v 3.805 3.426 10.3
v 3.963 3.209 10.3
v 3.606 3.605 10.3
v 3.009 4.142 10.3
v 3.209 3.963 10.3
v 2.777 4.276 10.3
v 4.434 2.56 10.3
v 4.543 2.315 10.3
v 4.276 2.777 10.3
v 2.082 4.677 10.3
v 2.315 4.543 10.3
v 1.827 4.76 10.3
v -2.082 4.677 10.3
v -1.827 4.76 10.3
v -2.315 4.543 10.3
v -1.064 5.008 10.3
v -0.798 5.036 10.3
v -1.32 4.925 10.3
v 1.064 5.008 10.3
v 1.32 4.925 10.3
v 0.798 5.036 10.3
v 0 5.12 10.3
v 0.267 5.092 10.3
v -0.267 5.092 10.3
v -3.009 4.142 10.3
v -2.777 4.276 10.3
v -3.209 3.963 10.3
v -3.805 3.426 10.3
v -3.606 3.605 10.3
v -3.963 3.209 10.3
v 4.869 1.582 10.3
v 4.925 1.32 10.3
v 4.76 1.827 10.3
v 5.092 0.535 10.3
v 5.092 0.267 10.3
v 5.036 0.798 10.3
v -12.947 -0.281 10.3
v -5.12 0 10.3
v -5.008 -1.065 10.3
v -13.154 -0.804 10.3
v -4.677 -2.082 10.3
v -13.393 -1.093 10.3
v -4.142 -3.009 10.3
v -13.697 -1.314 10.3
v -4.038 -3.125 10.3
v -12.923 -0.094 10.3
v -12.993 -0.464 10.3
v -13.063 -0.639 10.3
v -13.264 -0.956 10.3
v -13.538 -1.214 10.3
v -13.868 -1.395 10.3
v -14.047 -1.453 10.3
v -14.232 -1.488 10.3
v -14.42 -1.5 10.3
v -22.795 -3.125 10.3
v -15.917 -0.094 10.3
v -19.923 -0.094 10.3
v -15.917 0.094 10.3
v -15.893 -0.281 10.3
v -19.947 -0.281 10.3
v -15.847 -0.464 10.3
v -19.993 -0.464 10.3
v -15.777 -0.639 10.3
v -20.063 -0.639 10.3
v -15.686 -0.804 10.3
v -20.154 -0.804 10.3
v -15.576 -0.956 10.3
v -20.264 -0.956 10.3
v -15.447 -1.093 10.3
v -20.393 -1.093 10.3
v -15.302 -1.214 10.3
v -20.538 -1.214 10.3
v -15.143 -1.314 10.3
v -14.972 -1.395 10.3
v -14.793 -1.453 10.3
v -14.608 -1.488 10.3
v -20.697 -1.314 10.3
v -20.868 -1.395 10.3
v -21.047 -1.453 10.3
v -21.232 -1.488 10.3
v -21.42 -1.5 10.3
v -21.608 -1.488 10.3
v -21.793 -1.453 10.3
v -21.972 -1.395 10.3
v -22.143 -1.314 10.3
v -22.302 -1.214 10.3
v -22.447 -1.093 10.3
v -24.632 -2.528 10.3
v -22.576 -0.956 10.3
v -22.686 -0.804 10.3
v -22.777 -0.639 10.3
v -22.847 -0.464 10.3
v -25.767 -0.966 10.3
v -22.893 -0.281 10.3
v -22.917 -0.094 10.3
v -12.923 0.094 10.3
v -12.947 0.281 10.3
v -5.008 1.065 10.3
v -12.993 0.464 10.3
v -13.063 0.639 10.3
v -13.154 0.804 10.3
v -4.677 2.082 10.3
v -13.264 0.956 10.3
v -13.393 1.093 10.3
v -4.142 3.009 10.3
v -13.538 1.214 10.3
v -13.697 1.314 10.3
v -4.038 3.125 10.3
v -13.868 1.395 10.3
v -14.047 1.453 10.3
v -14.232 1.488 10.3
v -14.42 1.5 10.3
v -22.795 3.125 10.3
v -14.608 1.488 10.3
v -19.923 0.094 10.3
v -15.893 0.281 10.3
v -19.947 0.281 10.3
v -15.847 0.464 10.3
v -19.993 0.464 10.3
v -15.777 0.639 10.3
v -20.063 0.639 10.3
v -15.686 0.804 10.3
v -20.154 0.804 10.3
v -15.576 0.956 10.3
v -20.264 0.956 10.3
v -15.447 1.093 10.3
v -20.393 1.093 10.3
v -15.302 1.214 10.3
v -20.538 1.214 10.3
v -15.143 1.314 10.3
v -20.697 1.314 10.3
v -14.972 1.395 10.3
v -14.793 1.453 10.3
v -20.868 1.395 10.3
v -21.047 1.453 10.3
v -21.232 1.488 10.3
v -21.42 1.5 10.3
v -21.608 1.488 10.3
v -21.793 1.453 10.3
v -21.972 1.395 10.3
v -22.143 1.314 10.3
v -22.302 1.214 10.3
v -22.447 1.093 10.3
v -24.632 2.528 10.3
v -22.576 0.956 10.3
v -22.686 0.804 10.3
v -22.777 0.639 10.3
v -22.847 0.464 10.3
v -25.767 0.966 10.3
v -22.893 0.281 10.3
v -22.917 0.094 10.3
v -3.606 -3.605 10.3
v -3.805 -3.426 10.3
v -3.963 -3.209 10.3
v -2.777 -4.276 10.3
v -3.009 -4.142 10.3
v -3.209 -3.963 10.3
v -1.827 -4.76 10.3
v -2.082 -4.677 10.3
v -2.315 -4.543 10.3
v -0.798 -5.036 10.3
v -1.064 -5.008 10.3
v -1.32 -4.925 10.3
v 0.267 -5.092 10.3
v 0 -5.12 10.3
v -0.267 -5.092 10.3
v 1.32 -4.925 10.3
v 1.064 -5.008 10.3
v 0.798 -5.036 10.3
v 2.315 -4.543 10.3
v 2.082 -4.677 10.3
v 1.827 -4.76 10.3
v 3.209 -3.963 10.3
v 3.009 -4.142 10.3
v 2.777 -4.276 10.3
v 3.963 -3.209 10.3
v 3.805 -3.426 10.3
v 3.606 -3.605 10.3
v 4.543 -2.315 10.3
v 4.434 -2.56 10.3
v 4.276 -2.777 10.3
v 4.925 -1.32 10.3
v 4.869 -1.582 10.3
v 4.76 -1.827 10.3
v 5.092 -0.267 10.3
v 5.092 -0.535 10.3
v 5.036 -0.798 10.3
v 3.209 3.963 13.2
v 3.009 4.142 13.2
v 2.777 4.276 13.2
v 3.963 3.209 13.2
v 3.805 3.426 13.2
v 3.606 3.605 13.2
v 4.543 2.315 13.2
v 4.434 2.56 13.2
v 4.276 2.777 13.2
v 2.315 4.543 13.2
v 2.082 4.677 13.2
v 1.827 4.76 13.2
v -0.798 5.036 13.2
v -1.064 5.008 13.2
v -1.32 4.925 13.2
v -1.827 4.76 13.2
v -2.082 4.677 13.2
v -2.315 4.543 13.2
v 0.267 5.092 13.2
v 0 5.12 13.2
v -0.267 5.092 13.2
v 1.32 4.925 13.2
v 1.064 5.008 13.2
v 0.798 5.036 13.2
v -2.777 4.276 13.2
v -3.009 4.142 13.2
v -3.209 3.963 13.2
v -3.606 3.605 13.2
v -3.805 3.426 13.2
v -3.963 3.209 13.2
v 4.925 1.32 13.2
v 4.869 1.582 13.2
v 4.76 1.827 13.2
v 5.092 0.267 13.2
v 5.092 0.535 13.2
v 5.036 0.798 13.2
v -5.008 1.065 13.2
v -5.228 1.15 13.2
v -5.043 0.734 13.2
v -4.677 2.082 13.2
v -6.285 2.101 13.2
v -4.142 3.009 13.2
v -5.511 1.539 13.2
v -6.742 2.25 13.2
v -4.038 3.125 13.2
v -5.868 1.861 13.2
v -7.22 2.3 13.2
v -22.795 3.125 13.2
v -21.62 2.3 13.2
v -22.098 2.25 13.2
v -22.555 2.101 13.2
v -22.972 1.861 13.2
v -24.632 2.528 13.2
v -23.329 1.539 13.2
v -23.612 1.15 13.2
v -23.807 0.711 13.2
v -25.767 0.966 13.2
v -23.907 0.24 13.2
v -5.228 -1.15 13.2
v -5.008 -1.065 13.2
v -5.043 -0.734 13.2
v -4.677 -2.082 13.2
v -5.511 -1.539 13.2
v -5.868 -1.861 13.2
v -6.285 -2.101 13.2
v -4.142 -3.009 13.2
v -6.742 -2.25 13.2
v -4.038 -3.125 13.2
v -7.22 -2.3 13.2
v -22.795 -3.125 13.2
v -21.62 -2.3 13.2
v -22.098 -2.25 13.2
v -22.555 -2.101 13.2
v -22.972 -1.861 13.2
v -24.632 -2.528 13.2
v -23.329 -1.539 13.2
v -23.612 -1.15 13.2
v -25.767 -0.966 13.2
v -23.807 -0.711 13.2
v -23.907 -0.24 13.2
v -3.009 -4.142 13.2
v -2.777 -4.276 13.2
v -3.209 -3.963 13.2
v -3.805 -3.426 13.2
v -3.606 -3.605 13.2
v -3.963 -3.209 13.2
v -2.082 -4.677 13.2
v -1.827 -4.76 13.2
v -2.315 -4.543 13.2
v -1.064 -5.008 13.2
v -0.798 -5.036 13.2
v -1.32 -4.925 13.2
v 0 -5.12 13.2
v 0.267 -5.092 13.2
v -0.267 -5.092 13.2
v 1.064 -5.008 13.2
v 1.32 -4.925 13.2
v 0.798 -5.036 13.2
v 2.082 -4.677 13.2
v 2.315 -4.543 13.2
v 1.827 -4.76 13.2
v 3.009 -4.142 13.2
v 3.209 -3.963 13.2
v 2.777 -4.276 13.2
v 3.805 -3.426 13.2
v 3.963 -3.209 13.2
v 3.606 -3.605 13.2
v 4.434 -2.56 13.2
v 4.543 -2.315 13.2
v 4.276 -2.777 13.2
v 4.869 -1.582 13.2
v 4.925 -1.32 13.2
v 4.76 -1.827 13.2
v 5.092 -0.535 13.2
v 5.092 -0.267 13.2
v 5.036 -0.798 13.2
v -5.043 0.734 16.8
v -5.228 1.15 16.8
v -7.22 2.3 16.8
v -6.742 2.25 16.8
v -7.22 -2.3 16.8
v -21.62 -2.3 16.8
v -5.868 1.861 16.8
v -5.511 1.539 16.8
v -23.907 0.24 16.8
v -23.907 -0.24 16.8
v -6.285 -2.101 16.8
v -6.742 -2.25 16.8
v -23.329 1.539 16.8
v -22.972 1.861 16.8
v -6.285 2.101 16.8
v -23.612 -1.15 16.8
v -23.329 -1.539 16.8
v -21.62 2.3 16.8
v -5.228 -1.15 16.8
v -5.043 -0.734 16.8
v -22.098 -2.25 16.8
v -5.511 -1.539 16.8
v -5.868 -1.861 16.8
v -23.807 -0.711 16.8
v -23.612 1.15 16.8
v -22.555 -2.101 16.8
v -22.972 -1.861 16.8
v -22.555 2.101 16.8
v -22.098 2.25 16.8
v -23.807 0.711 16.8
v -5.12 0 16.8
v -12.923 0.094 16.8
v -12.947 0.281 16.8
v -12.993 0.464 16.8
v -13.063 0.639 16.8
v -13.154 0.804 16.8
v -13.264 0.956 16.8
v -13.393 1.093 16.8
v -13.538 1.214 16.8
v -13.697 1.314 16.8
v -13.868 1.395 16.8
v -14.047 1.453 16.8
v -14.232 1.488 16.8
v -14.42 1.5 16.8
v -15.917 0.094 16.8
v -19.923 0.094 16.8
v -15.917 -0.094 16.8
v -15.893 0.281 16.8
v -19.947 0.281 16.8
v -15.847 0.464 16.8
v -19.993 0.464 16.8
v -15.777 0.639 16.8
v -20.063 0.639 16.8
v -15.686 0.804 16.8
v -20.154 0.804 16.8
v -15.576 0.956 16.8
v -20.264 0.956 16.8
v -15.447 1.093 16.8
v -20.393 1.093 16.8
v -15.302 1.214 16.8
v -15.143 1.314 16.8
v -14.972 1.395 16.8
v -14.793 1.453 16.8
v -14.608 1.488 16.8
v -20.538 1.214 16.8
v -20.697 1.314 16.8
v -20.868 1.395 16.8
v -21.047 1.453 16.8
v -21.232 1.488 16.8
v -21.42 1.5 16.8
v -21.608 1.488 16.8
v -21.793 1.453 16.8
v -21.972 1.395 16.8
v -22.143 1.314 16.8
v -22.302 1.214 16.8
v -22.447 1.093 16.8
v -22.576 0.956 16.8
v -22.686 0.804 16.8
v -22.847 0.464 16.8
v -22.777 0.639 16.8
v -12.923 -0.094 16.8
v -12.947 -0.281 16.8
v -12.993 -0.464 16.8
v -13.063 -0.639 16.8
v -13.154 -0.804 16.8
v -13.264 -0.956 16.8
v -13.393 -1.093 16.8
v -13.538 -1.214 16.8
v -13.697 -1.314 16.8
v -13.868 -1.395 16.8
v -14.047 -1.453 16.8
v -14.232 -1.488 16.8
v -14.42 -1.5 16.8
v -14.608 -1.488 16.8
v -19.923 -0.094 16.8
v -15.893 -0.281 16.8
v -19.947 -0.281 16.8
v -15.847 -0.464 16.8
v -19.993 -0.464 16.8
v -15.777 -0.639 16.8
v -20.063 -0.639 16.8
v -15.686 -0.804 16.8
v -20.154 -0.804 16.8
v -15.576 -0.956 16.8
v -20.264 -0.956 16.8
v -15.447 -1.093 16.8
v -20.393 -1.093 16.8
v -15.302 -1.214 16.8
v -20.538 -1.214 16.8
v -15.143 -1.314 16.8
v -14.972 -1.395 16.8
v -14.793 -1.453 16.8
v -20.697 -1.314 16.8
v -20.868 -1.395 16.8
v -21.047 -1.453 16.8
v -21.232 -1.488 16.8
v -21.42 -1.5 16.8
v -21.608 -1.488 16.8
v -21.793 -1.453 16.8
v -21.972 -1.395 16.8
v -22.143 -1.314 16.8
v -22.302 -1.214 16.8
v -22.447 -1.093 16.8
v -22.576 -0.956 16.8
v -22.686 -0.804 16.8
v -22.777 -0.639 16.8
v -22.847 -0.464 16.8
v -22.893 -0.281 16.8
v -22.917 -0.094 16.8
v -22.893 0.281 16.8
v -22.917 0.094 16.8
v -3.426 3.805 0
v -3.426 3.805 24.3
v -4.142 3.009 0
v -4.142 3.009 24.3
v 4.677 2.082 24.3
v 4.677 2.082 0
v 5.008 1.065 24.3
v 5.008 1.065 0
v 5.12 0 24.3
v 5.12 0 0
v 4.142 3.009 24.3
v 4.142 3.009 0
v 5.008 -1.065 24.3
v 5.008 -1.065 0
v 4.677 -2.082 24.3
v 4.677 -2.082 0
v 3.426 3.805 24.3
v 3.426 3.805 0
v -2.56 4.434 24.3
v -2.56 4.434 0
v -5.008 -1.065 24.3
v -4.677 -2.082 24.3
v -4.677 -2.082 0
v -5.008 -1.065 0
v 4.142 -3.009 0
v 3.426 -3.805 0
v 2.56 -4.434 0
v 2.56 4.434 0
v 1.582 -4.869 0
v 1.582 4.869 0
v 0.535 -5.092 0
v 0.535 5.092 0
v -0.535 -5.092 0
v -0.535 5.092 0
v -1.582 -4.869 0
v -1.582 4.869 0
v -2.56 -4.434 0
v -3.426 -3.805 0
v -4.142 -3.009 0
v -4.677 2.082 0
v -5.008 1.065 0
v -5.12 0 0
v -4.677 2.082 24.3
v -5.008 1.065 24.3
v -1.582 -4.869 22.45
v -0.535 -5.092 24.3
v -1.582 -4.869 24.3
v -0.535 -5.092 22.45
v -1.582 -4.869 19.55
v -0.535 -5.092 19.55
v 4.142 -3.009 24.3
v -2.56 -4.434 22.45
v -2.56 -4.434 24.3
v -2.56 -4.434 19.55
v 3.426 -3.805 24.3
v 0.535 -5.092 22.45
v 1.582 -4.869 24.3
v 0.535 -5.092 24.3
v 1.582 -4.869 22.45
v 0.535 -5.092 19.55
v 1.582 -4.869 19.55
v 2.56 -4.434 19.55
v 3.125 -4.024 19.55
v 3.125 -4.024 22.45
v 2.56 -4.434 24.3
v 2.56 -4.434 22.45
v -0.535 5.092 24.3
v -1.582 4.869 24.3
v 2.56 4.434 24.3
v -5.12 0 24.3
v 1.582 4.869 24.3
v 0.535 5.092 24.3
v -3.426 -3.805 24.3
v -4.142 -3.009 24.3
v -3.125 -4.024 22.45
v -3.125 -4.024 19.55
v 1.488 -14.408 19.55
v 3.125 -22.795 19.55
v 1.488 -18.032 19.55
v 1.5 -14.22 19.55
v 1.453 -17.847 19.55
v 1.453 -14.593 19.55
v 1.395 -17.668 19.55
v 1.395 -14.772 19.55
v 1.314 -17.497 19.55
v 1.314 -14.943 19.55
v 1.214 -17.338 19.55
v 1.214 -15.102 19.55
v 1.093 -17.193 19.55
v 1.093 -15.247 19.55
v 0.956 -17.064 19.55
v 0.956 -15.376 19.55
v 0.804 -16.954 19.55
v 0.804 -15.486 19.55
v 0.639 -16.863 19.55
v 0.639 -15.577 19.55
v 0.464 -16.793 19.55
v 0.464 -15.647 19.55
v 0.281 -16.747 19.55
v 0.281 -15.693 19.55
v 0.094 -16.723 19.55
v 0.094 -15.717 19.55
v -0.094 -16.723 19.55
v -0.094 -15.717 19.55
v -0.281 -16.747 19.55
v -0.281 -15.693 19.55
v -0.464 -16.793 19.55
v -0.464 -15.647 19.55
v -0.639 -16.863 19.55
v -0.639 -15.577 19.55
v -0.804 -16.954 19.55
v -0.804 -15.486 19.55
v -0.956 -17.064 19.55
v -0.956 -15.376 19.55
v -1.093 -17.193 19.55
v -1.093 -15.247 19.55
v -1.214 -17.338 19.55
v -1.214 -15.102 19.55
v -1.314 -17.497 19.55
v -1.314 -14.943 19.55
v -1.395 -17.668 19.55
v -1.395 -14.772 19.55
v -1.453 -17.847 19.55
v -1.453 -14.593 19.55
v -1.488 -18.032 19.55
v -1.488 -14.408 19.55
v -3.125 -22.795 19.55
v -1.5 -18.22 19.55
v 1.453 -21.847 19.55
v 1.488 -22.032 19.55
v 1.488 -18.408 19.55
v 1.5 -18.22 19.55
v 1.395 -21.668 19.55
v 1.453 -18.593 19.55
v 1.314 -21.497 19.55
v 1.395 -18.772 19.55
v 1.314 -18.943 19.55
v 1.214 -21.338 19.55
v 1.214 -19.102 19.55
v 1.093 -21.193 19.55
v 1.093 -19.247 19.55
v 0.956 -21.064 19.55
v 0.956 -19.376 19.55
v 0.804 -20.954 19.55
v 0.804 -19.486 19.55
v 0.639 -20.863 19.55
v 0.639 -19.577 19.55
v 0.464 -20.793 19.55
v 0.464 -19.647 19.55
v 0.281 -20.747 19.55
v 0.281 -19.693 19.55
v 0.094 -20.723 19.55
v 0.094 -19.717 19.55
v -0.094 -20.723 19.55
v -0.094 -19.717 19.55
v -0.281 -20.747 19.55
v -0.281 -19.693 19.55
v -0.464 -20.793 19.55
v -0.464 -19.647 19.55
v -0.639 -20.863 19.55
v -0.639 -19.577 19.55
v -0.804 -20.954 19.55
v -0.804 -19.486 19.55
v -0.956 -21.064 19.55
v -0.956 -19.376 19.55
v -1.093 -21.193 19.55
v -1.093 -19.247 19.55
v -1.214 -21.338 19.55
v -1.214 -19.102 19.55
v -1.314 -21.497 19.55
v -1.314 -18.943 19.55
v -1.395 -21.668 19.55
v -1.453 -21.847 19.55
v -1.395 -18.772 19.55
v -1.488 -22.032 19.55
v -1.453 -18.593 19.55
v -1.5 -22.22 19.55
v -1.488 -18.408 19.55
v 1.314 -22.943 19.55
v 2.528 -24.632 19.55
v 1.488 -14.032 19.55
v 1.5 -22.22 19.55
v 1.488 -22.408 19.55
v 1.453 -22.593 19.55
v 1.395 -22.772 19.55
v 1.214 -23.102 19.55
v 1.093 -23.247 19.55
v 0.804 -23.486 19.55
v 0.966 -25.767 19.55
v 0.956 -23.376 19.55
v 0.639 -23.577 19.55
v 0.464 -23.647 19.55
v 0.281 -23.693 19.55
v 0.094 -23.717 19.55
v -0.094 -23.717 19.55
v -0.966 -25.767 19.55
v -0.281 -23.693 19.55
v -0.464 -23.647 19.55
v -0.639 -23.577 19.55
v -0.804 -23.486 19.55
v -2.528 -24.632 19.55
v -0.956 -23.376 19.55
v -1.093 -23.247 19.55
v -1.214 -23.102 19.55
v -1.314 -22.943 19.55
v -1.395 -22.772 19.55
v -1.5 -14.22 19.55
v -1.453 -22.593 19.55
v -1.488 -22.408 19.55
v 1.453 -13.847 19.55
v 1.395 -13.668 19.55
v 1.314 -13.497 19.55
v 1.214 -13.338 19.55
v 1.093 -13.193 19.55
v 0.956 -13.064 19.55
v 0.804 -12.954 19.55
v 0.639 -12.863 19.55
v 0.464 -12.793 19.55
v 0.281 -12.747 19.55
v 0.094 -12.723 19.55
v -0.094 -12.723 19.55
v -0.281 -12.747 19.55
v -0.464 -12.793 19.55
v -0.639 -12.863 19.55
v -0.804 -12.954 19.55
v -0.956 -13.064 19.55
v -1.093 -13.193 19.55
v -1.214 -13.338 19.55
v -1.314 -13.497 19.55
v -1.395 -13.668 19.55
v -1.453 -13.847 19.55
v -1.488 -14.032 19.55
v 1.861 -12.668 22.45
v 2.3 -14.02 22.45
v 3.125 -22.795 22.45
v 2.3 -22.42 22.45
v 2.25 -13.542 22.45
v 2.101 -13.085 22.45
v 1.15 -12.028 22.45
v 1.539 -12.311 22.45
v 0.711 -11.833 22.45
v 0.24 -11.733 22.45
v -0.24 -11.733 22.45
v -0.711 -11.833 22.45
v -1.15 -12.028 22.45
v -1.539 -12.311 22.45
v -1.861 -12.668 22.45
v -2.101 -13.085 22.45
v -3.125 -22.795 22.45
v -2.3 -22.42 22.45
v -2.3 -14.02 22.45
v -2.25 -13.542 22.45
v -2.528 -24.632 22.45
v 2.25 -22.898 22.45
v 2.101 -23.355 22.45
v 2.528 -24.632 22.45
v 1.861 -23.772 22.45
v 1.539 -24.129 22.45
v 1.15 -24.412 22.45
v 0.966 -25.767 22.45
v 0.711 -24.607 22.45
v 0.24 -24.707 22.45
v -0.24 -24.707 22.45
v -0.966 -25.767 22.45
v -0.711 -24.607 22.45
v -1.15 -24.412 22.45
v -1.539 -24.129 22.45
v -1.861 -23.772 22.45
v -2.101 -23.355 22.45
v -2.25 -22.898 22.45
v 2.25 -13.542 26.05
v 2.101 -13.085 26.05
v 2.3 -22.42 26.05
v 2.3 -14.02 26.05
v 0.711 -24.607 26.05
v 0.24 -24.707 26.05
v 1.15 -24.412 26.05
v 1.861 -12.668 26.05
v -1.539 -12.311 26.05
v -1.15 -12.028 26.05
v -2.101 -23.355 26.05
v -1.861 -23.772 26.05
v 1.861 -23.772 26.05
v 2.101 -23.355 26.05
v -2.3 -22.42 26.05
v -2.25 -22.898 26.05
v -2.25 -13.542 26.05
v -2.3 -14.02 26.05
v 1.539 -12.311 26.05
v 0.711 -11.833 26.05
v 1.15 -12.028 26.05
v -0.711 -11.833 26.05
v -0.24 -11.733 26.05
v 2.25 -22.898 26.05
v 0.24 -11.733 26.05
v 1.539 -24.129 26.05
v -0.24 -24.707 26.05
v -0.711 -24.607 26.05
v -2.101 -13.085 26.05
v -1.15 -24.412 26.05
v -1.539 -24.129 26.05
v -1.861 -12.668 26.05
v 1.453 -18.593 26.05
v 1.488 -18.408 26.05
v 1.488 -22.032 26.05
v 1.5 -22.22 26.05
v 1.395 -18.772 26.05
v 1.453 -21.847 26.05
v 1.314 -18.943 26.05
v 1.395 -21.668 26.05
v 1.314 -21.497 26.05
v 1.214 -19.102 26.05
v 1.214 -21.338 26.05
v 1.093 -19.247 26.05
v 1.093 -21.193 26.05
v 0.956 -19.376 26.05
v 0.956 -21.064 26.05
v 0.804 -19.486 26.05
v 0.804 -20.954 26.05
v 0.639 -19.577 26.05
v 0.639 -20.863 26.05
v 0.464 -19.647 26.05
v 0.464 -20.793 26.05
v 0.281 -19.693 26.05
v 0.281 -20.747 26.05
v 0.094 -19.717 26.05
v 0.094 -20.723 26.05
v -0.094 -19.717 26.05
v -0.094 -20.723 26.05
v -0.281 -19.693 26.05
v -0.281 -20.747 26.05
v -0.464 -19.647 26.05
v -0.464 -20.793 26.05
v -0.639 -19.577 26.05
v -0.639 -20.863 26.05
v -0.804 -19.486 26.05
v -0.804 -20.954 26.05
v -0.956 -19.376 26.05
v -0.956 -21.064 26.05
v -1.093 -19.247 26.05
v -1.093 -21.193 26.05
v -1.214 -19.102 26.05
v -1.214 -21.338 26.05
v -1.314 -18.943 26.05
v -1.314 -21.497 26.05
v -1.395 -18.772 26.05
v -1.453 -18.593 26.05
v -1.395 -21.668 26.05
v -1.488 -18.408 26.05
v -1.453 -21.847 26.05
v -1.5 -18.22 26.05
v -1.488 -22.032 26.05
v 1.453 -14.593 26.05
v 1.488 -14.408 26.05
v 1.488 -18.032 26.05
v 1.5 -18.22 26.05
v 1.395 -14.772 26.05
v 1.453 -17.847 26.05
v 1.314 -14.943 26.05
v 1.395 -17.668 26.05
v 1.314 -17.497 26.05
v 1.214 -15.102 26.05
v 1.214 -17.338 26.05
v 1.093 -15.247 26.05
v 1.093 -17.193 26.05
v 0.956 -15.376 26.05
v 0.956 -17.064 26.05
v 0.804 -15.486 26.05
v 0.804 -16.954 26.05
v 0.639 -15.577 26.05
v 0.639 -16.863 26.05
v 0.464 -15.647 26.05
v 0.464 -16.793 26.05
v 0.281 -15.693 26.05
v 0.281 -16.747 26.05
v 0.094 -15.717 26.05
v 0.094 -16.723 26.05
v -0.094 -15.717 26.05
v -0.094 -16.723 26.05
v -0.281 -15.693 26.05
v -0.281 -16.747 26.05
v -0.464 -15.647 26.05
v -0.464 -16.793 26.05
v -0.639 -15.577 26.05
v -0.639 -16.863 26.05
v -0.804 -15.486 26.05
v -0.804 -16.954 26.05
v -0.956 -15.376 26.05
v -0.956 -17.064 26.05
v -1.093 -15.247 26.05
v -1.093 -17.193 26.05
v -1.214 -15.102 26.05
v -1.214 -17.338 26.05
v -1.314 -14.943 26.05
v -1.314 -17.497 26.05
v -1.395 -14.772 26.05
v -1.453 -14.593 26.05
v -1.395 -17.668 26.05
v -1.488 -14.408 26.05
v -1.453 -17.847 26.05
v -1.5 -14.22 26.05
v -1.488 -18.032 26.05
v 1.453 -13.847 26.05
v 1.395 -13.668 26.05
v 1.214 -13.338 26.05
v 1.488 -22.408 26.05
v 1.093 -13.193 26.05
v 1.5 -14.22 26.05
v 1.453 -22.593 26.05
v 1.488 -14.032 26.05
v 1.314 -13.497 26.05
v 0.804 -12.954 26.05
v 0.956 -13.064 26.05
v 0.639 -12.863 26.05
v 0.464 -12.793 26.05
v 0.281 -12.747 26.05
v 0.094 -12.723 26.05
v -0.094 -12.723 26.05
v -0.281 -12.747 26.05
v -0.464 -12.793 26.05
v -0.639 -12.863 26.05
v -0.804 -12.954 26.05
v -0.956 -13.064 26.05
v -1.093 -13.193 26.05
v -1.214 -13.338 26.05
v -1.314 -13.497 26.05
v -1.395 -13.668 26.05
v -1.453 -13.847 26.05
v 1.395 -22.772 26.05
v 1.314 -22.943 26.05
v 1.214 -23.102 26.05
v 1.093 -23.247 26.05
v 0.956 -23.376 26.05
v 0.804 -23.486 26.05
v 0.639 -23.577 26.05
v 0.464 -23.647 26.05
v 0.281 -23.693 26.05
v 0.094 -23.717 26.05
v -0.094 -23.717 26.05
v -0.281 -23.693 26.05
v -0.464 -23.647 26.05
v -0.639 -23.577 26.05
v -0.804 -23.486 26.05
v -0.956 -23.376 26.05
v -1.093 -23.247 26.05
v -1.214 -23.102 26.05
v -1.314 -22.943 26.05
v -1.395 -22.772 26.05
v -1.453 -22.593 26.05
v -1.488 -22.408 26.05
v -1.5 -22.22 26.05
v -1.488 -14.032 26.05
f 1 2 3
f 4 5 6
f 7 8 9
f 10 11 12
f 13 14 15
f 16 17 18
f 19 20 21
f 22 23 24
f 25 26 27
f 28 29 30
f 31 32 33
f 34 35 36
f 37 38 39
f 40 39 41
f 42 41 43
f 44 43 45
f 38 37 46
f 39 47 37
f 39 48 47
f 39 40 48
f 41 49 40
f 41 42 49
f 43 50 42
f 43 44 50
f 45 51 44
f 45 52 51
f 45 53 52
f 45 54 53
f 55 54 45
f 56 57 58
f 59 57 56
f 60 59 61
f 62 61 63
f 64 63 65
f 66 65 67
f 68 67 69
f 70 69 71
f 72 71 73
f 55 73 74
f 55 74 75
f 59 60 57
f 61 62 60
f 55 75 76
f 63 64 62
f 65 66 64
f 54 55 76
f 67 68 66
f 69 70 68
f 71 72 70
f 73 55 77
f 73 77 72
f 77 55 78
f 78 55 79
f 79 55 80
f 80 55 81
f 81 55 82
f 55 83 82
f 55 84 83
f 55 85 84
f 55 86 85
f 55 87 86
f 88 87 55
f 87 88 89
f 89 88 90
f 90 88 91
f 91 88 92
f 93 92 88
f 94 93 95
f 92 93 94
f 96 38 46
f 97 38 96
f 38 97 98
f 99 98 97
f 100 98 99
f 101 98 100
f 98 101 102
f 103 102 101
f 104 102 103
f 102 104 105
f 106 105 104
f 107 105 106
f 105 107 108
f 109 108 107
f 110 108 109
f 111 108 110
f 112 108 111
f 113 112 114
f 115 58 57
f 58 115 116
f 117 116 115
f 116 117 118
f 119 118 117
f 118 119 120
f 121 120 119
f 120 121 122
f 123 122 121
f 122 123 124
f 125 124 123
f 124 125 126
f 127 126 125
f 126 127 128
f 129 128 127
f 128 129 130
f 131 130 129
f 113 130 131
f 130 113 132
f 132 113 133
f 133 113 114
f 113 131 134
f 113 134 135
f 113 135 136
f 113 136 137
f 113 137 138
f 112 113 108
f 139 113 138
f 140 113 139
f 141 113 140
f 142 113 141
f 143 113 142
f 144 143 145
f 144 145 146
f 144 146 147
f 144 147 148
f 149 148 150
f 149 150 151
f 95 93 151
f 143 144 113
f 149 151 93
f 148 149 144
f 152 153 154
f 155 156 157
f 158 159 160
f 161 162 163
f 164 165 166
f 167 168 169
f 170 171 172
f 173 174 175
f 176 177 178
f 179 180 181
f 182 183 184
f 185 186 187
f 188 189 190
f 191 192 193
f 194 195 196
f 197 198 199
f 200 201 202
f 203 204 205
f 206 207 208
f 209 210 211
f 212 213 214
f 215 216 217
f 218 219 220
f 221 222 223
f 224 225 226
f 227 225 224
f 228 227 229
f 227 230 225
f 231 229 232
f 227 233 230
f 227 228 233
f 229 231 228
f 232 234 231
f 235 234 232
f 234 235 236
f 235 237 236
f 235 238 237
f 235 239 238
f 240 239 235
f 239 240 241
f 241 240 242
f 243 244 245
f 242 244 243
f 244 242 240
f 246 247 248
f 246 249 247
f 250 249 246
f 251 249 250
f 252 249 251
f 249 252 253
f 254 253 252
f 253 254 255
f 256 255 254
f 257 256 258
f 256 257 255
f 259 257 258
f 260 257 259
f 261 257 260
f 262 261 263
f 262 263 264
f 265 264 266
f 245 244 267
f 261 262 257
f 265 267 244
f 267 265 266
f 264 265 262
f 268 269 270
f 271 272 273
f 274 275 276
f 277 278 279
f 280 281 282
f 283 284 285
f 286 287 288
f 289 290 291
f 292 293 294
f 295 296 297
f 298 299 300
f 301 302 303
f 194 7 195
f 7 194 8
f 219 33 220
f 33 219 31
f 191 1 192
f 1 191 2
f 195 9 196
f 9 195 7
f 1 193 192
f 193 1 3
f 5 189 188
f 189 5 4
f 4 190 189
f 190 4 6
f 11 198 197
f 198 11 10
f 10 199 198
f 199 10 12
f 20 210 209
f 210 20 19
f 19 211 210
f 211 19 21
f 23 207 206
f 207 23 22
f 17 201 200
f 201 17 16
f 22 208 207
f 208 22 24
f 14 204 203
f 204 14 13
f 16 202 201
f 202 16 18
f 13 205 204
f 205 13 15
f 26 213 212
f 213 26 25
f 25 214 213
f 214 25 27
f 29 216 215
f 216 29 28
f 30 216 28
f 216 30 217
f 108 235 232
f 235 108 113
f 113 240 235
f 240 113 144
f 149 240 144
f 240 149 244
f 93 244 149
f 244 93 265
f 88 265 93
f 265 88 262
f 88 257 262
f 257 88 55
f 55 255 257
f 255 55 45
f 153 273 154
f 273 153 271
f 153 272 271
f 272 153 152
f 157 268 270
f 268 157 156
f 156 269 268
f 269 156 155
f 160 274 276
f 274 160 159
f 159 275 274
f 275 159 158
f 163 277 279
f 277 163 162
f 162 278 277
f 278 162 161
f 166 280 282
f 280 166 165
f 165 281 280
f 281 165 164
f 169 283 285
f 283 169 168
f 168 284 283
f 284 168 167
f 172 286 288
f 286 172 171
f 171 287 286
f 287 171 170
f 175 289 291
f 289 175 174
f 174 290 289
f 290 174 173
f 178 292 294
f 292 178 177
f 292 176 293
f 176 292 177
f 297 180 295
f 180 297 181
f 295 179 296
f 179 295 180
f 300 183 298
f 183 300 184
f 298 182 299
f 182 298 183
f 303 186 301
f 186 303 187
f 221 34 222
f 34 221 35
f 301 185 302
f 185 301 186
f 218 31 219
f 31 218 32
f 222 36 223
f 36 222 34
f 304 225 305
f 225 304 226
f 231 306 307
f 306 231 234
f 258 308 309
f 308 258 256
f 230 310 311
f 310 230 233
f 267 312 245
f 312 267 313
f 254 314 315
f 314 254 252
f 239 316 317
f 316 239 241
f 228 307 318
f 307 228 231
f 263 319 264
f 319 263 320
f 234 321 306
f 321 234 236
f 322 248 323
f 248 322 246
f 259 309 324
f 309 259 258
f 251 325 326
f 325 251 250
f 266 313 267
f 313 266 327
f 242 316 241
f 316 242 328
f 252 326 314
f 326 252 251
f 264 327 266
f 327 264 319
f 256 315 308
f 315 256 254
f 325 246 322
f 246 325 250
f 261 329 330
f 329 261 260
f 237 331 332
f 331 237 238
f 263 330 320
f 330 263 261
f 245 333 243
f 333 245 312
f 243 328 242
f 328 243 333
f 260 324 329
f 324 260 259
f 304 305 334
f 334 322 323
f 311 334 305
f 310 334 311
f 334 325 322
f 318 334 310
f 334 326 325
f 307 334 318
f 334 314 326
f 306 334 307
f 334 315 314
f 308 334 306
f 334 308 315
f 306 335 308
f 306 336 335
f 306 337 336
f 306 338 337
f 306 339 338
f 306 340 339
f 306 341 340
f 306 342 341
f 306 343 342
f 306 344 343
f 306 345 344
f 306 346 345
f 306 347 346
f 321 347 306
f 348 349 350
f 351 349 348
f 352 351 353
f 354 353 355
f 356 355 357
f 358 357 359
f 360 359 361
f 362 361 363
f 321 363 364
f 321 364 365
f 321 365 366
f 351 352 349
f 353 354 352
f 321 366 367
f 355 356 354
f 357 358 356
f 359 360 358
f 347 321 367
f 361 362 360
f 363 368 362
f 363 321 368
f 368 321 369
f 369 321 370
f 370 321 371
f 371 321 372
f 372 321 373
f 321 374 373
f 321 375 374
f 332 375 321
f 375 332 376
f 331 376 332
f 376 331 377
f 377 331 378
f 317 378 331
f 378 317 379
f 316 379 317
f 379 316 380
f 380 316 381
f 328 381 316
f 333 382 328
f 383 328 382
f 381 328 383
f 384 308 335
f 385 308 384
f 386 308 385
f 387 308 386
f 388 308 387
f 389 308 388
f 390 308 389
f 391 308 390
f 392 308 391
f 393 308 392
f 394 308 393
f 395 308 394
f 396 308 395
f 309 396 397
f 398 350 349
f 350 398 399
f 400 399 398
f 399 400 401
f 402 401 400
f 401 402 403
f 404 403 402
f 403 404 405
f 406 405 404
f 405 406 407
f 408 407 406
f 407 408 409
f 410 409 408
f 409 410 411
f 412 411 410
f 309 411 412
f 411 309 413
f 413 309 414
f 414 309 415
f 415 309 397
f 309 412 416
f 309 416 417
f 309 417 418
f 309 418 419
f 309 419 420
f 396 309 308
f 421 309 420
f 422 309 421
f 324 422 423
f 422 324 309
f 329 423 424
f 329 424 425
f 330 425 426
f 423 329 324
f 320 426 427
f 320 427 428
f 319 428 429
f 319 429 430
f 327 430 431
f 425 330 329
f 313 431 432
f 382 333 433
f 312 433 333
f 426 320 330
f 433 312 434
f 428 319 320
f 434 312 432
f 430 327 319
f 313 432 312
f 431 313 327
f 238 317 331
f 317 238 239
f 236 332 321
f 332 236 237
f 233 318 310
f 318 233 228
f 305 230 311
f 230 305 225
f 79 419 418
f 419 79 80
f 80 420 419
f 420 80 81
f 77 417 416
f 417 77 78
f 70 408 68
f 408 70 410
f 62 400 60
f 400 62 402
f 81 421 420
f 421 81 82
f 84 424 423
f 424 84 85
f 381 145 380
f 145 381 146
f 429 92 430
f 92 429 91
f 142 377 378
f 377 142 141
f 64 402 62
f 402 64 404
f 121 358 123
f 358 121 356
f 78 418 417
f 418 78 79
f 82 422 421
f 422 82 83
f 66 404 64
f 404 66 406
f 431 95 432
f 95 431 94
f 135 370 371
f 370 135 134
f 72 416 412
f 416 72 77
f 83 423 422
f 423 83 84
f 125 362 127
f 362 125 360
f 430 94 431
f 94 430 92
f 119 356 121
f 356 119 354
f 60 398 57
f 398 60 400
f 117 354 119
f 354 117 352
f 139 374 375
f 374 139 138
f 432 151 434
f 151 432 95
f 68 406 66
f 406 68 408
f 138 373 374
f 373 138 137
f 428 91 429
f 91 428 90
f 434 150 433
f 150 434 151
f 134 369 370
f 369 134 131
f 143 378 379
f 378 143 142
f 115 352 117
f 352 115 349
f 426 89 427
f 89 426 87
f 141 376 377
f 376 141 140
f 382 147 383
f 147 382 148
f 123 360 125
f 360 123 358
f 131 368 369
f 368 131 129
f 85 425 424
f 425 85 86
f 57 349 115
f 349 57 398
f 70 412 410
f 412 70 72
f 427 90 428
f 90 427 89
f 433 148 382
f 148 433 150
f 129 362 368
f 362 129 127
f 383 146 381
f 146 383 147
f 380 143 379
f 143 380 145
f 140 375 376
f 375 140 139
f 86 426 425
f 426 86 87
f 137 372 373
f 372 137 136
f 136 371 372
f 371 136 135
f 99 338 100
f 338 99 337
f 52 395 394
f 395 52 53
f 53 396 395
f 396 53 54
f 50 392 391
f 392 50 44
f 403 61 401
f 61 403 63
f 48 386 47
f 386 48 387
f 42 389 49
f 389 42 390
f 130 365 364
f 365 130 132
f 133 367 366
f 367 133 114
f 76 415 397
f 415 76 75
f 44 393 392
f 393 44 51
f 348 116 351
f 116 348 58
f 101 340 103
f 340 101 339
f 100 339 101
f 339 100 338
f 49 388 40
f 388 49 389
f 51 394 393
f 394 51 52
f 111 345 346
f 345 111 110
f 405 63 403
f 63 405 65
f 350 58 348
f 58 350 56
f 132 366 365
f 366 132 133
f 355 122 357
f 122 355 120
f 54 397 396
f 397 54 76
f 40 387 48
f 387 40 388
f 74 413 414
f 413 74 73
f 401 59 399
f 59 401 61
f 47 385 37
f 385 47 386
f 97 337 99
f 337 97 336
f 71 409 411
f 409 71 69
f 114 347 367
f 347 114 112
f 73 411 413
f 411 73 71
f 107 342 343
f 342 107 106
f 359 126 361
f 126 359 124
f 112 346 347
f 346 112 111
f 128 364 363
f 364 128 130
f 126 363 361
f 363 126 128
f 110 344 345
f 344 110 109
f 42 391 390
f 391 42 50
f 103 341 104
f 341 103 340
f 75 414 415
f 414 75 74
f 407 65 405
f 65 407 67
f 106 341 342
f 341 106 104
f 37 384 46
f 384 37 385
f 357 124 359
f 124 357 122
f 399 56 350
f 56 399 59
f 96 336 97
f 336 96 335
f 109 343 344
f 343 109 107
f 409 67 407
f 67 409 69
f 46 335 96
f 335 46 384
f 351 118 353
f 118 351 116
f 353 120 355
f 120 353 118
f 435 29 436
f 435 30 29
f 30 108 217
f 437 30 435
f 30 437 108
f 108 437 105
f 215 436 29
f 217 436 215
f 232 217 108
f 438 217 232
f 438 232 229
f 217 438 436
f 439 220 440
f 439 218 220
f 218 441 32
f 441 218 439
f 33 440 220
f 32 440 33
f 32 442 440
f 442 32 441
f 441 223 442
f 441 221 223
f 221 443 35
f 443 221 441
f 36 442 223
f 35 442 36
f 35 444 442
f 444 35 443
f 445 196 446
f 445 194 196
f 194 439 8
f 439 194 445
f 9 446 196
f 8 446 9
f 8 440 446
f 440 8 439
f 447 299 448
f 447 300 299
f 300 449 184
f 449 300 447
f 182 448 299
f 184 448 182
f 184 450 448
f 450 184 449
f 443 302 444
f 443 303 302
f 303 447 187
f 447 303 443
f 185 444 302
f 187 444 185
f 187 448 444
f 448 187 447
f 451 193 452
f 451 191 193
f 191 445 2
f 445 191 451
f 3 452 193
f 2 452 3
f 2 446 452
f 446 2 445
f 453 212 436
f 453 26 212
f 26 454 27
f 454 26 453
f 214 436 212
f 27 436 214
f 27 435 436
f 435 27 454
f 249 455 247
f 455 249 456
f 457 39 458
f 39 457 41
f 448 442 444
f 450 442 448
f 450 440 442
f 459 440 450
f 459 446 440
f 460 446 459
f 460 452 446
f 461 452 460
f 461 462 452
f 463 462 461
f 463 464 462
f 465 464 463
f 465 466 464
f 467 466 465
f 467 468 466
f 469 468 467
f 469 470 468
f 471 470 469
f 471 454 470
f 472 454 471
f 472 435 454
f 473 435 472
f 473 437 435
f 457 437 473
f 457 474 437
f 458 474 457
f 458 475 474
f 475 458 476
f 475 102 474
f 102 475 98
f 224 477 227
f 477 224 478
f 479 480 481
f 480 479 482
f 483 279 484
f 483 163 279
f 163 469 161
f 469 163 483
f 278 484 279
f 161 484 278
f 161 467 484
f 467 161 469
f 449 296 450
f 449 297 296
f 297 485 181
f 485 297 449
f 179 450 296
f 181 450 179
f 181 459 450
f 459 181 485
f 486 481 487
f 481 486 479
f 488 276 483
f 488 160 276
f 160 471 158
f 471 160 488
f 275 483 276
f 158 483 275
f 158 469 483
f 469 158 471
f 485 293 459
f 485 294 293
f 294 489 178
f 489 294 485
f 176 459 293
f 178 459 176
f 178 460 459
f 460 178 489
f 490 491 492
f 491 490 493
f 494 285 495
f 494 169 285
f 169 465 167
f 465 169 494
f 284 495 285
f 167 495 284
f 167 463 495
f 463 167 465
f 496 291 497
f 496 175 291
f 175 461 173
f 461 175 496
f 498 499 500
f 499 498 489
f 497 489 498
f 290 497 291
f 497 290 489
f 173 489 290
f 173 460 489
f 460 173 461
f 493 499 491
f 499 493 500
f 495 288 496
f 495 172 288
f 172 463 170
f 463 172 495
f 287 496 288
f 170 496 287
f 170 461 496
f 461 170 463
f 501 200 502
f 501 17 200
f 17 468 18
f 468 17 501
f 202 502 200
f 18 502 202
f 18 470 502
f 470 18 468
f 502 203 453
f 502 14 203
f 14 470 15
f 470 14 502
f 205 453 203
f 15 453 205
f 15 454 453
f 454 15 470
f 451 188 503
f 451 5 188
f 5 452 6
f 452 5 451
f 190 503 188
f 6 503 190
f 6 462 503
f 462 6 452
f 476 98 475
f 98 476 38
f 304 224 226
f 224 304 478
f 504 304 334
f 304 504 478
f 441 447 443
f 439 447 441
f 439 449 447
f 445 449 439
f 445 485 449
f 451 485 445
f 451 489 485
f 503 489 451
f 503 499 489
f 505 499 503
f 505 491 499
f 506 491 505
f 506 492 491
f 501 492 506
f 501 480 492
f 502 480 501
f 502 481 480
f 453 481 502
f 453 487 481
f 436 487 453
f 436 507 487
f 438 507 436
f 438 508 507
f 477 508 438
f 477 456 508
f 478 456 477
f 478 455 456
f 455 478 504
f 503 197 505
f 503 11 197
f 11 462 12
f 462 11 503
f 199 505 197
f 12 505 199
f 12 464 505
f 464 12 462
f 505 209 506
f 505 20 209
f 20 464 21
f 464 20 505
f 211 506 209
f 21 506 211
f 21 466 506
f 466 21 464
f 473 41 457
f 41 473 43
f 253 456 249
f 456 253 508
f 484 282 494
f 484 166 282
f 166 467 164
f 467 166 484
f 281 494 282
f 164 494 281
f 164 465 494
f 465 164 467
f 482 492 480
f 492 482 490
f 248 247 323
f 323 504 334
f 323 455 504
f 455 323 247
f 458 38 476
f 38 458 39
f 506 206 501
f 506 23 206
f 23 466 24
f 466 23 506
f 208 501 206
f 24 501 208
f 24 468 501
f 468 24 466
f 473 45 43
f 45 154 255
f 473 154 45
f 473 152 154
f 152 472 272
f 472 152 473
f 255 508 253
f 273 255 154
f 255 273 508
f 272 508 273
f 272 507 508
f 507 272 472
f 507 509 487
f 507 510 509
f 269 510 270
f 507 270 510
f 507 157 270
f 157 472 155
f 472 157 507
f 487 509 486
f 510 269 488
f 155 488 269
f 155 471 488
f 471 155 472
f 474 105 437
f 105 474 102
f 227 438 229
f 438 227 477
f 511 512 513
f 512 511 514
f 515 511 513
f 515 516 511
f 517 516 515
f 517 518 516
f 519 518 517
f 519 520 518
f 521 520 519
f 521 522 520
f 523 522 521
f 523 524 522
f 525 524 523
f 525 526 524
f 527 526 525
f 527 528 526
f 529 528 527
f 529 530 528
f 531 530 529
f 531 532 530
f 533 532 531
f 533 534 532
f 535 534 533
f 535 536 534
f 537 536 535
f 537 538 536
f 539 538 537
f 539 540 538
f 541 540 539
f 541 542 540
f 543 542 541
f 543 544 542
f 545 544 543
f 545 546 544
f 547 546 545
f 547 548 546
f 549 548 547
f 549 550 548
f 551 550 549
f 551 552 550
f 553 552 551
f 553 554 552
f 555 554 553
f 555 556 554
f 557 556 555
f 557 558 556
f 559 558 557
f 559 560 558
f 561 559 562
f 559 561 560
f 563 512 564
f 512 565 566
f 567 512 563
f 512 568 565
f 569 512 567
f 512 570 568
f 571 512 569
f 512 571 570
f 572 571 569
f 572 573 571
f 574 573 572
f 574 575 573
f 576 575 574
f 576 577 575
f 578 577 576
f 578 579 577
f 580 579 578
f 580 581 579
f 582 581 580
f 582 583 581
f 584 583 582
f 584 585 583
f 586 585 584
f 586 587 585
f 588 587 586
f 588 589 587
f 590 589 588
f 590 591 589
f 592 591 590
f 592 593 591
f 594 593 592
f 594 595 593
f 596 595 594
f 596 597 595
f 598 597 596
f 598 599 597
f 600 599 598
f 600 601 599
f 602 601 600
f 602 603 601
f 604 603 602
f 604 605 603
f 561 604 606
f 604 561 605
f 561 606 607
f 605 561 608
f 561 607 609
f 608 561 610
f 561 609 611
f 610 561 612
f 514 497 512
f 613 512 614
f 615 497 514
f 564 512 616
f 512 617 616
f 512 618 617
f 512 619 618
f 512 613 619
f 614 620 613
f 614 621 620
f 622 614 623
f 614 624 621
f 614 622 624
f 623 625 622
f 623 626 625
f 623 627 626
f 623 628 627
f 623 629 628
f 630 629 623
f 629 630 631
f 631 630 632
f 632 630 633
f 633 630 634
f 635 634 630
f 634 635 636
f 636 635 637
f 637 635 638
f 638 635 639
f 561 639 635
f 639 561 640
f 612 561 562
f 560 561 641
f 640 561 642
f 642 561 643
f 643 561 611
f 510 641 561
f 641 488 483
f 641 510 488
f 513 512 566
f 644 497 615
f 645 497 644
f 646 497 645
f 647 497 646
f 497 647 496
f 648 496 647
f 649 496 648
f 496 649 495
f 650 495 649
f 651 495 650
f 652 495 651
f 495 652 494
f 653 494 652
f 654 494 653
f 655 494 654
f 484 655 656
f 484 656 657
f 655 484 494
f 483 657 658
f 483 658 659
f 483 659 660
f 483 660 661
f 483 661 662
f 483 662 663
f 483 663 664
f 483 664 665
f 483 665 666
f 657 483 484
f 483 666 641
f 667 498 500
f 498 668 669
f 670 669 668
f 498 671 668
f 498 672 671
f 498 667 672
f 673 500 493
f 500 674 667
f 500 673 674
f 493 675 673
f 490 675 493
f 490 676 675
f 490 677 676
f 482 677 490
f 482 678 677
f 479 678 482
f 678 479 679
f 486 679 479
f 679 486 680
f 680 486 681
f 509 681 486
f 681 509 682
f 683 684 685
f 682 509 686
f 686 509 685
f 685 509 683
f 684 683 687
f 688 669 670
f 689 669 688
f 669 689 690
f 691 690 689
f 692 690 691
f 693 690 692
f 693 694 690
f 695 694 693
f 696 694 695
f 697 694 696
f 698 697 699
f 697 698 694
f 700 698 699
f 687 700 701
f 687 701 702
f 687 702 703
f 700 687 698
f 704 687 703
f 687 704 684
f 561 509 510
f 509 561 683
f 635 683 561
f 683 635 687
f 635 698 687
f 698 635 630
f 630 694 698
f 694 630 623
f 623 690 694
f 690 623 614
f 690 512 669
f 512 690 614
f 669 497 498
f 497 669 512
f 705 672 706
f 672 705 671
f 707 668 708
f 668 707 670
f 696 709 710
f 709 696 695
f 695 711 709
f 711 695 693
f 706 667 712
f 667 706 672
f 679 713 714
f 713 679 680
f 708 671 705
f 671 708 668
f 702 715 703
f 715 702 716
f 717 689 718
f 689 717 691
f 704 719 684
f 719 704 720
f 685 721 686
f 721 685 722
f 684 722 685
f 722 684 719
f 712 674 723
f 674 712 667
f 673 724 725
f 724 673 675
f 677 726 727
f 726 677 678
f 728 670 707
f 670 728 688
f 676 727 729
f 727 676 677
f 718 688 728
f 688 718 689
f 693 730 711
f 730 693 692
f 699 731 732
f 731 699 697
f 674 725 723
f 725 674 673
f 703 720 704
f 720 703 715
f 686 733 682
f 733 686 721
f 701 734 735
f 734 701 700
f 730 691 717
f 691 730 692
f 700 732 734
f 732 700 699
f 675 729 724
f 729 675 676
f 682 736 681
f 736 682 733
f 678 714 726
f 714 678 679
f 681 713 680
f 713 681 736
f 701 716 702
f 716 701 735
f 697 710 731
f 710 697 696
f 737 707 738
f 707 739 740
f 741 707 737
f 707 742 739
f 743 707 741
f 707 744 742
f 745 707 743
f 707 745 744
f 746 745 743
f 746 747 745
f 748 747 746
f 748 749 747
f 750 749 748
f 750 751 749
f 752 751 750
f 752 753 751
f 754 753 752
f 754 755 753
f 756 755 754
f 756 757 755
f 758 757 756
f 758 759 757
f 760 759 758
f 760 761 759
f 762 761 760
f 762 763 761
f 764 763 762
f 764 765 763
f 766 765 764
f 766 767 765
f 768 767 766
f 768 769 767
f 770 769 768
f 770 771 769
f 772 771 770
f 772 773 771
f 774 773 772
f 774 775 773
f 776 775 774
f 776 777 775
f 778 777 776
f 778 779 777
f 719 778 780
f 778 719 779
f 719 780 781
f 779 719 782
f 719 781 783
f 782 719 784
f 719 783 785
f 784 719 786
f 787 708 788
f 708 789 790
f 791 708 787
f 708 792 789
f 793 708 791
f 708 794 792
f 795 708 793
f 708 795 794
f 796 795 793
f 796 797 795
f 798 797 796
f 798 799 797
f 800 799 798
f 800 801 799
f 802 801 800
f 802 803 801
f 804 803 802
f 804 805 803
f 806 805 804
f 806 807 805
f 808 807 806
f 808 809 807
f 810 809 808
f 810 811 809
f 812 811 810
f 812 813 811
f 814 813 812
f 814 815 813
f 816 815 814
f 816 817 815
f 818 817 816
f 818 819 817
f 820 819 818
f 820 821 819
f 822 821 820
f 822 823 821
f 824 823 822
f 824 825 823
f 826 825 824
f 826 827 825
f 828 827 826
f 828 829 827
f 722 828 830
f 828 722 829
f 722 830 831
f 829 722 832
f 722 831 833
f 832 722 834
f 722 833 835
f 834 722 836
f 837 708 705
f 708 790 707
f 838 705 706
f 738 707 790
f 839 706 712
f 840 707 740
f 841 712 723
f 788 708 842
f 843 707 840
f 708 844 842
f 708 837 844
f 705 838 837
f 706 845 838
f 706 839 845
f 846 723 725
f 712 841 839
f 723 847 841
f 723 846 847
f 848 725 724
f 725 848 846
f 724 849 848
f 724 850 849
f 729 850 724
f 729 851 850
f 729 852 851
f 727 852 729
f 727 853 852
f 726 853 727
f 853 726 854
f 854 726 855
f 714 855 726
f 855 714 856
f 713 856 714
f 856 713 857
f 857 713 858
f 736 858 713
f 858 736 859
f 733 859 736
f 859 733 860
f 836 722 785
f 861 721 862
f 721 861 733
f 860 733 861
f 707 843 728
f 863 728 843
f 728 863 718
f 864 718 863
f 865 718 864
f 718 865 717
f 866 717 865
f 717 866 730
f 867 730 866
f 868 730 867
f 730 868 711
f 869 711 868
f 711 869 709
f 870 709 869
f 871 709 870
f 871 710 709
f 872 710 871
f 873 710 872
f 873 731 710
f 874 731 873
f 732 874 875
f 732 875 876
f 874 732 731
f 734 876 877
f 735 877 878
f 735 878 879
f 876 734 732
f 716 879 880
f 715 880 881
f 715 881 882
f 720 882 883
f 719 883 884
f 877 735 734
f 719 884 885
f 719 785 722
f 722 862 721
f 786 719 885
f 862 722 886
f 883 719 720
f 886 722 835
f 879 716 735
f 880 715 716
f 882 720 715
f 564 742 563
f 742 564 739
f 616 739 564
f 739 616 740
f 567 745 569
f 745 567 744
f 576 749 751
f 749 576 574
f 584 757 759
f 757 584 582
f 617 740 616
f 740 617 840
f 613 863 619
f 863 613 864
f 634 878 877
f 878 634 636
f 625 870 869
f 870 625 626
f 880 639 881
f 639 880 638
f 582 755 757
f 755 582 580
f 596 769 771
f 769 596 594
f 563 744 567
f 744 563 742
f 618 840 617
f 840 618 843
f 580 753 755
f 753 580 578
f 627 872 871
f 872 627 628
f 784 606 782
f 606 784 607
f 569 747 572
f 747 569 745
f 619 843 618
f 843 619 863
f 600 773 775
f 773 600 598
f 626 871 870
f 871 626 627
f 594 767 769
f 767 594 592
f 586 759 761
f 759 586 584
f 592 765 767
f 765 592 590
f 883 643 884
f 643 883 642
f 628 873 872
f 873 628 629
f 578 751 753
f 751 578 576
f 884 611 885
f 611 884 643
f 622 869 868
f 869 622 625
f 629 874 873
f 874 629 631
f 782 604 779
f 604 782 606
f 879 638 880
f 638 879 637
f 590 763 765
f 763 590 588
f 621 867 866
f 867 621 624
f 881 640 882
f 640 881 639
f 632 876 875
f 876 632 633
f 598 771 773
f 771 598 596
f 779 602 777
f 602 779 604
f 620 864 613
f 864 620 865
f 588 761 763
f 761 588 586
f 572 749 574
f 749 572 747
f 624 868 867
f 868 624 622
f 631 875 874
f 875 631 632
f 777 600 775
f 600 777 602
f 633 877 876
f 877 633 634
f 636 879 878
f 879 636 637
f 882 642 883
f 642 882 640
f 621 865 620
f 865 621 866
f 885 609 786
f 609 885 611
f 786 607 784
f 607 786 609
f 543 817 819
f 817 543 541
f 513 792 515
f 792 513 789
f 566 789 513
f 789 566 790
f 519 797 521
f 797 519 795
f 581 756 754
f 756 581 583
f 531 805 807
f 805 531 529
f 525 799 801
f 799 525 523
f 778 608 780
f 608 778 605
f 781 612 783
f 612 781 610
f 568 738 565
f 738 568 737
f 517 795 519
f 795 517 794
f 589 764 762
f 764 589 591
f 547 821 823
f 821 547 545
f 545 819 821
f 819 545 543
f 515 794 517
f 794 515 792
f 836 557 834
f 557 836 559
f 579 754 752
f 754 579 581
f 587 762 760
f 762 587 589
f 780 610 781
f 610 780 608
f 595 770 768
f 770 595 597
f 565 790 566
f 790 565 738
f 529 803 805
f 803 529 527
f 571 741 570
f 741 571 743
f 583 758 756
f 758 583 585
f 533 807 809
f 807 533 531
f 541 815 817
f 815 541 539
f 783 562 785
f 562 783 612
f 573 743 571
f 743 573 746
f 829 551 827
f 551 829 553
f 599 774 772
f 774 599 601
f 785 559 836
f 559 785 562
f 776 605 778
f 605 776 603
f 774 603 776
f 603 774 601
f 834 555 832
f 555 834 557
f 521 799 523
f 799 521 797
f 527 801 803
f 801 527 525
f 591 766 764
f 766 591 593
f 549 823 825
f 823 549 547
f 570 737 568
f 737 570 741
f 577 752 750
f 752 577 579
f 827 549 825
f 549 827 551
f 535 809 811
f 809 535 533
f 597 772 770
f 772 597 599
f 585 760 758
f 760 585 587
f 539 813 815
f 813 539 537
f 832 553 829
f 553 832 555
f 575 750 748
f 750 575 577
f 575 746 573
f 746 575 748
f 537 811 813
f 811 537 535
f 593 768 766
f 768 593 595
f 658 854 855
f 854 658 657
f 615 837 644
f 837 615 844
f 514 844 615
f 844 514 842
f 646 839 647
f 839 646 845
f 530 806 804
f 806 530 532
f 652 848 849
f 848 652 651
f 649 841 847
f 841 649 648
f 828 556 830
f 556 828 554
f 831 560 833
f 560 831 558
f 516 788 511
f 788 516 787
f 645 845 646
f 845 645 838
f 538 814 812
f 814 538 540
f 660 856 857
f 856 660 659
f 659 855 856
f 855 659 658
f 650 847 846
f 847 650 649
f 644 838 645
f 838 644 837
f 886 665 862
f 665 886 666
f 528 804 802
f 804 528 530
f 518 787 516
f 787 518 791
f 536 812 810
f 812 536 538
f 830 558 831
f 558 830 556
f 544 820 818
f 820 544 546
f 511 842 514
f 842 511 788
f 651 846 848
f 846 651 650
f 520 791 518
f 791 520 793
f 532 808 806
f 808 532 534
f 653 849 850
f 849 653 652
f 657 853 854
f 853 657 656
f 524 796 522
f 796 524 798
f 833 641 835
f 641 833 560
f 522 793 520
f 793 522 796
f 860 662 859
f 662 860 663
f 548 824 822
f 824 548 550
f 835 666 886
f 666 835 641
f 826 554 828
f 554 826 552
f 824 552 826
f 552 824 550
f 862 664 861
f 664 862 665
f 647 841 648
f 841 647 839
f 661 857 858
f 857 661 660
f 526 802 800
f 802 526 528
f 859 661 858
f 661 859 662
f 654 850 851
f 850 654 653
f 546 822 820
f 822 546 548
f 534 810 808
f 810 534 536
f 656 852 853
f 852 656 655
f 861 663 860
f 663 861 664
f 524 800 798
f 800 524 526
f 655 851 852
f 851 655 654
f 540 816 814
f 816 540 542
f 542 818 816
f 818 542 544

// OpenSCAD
include <../colors.scad>
include <../parameters.scad>
include <../steering_params.scad>

use <../lib/shapes2d.scad>
use <../lib/shapes3d.scad>
use <../lib/trapezoids.scad>
use <../placeholders/servo_arm.scad>

module bellcrank_arm(fn=30, h=bellcrank_arm_h, color=cobalt_blue_metallic) {

  color(color, alpha=1) {
    cylinder(d=bellcrank_arm_dia, h=h, $fn=fn);

    translate([0, 0, bellcrank_arm_z]) {

      rotate([0, 0, 90]) {
        servo_arm(arm_d=bellcrank_arm_dia,
                  arm_len=bellcrank_arm_len,
                  arm_base_h=bellcrank_arm_thickness,
                  arm_bolt_boss_h=pitman_arm_boss_h,
                  arm_bolt_boss_w=pitman_arm_boss_w,
                  bolt_n=2,
                  arm_bolt_boss_spacing=bellcrank_arm_bolt_gap,
                  arm_bolt_boss_padding=bellcrank_arm_bolt_padding,
                  arm_thickness=bellcrank_arm_thickness,
                  boss_inner_padding=pitman_arm_boss_inner_padding,
                  arm_w=bellcrank_arm_w,
                  bolt_d=bellcrank_arm_bolt_d,
                  arm_center_bolt_d=0);
      }
    }
  }
}

module pitman_arm() {
  bellcrank_arm(h=pitman_arm_h);
  translate([0, 0, bellcrank_pitman_arm_z]) {
    rotate([0, 0, 180]) {
      servo_arm(arm_d=bellcrank_arm_dia,
                arm_len=bellcrank_arm_len,
                arm_base_h=bellcrank_arm_thickness,
                arm_bolt_boss_h=pitman_arm_boss_h,
                arm_bolt_boss_w=pitman_arm_boss_w,
                bolt_n=pitman_arm_bolt_n,
                arm_bolt_boss_spacing=pitman_arm_bolt_boss_spacing,
                arm_bolt_boss_padding=pitman_arm_bolt_boss_padding,
                arm_thickness=bellcrank_arm_thickness,
                boss_inner_padding=pitman_arm_boss_inner_padding,
                arm_w=bellcrank_arm_w,
                bolt_d=pitman_arm_bolt_d,
                arm_center_bolt_d=0);
    }
  }
}

pitman_arm();
